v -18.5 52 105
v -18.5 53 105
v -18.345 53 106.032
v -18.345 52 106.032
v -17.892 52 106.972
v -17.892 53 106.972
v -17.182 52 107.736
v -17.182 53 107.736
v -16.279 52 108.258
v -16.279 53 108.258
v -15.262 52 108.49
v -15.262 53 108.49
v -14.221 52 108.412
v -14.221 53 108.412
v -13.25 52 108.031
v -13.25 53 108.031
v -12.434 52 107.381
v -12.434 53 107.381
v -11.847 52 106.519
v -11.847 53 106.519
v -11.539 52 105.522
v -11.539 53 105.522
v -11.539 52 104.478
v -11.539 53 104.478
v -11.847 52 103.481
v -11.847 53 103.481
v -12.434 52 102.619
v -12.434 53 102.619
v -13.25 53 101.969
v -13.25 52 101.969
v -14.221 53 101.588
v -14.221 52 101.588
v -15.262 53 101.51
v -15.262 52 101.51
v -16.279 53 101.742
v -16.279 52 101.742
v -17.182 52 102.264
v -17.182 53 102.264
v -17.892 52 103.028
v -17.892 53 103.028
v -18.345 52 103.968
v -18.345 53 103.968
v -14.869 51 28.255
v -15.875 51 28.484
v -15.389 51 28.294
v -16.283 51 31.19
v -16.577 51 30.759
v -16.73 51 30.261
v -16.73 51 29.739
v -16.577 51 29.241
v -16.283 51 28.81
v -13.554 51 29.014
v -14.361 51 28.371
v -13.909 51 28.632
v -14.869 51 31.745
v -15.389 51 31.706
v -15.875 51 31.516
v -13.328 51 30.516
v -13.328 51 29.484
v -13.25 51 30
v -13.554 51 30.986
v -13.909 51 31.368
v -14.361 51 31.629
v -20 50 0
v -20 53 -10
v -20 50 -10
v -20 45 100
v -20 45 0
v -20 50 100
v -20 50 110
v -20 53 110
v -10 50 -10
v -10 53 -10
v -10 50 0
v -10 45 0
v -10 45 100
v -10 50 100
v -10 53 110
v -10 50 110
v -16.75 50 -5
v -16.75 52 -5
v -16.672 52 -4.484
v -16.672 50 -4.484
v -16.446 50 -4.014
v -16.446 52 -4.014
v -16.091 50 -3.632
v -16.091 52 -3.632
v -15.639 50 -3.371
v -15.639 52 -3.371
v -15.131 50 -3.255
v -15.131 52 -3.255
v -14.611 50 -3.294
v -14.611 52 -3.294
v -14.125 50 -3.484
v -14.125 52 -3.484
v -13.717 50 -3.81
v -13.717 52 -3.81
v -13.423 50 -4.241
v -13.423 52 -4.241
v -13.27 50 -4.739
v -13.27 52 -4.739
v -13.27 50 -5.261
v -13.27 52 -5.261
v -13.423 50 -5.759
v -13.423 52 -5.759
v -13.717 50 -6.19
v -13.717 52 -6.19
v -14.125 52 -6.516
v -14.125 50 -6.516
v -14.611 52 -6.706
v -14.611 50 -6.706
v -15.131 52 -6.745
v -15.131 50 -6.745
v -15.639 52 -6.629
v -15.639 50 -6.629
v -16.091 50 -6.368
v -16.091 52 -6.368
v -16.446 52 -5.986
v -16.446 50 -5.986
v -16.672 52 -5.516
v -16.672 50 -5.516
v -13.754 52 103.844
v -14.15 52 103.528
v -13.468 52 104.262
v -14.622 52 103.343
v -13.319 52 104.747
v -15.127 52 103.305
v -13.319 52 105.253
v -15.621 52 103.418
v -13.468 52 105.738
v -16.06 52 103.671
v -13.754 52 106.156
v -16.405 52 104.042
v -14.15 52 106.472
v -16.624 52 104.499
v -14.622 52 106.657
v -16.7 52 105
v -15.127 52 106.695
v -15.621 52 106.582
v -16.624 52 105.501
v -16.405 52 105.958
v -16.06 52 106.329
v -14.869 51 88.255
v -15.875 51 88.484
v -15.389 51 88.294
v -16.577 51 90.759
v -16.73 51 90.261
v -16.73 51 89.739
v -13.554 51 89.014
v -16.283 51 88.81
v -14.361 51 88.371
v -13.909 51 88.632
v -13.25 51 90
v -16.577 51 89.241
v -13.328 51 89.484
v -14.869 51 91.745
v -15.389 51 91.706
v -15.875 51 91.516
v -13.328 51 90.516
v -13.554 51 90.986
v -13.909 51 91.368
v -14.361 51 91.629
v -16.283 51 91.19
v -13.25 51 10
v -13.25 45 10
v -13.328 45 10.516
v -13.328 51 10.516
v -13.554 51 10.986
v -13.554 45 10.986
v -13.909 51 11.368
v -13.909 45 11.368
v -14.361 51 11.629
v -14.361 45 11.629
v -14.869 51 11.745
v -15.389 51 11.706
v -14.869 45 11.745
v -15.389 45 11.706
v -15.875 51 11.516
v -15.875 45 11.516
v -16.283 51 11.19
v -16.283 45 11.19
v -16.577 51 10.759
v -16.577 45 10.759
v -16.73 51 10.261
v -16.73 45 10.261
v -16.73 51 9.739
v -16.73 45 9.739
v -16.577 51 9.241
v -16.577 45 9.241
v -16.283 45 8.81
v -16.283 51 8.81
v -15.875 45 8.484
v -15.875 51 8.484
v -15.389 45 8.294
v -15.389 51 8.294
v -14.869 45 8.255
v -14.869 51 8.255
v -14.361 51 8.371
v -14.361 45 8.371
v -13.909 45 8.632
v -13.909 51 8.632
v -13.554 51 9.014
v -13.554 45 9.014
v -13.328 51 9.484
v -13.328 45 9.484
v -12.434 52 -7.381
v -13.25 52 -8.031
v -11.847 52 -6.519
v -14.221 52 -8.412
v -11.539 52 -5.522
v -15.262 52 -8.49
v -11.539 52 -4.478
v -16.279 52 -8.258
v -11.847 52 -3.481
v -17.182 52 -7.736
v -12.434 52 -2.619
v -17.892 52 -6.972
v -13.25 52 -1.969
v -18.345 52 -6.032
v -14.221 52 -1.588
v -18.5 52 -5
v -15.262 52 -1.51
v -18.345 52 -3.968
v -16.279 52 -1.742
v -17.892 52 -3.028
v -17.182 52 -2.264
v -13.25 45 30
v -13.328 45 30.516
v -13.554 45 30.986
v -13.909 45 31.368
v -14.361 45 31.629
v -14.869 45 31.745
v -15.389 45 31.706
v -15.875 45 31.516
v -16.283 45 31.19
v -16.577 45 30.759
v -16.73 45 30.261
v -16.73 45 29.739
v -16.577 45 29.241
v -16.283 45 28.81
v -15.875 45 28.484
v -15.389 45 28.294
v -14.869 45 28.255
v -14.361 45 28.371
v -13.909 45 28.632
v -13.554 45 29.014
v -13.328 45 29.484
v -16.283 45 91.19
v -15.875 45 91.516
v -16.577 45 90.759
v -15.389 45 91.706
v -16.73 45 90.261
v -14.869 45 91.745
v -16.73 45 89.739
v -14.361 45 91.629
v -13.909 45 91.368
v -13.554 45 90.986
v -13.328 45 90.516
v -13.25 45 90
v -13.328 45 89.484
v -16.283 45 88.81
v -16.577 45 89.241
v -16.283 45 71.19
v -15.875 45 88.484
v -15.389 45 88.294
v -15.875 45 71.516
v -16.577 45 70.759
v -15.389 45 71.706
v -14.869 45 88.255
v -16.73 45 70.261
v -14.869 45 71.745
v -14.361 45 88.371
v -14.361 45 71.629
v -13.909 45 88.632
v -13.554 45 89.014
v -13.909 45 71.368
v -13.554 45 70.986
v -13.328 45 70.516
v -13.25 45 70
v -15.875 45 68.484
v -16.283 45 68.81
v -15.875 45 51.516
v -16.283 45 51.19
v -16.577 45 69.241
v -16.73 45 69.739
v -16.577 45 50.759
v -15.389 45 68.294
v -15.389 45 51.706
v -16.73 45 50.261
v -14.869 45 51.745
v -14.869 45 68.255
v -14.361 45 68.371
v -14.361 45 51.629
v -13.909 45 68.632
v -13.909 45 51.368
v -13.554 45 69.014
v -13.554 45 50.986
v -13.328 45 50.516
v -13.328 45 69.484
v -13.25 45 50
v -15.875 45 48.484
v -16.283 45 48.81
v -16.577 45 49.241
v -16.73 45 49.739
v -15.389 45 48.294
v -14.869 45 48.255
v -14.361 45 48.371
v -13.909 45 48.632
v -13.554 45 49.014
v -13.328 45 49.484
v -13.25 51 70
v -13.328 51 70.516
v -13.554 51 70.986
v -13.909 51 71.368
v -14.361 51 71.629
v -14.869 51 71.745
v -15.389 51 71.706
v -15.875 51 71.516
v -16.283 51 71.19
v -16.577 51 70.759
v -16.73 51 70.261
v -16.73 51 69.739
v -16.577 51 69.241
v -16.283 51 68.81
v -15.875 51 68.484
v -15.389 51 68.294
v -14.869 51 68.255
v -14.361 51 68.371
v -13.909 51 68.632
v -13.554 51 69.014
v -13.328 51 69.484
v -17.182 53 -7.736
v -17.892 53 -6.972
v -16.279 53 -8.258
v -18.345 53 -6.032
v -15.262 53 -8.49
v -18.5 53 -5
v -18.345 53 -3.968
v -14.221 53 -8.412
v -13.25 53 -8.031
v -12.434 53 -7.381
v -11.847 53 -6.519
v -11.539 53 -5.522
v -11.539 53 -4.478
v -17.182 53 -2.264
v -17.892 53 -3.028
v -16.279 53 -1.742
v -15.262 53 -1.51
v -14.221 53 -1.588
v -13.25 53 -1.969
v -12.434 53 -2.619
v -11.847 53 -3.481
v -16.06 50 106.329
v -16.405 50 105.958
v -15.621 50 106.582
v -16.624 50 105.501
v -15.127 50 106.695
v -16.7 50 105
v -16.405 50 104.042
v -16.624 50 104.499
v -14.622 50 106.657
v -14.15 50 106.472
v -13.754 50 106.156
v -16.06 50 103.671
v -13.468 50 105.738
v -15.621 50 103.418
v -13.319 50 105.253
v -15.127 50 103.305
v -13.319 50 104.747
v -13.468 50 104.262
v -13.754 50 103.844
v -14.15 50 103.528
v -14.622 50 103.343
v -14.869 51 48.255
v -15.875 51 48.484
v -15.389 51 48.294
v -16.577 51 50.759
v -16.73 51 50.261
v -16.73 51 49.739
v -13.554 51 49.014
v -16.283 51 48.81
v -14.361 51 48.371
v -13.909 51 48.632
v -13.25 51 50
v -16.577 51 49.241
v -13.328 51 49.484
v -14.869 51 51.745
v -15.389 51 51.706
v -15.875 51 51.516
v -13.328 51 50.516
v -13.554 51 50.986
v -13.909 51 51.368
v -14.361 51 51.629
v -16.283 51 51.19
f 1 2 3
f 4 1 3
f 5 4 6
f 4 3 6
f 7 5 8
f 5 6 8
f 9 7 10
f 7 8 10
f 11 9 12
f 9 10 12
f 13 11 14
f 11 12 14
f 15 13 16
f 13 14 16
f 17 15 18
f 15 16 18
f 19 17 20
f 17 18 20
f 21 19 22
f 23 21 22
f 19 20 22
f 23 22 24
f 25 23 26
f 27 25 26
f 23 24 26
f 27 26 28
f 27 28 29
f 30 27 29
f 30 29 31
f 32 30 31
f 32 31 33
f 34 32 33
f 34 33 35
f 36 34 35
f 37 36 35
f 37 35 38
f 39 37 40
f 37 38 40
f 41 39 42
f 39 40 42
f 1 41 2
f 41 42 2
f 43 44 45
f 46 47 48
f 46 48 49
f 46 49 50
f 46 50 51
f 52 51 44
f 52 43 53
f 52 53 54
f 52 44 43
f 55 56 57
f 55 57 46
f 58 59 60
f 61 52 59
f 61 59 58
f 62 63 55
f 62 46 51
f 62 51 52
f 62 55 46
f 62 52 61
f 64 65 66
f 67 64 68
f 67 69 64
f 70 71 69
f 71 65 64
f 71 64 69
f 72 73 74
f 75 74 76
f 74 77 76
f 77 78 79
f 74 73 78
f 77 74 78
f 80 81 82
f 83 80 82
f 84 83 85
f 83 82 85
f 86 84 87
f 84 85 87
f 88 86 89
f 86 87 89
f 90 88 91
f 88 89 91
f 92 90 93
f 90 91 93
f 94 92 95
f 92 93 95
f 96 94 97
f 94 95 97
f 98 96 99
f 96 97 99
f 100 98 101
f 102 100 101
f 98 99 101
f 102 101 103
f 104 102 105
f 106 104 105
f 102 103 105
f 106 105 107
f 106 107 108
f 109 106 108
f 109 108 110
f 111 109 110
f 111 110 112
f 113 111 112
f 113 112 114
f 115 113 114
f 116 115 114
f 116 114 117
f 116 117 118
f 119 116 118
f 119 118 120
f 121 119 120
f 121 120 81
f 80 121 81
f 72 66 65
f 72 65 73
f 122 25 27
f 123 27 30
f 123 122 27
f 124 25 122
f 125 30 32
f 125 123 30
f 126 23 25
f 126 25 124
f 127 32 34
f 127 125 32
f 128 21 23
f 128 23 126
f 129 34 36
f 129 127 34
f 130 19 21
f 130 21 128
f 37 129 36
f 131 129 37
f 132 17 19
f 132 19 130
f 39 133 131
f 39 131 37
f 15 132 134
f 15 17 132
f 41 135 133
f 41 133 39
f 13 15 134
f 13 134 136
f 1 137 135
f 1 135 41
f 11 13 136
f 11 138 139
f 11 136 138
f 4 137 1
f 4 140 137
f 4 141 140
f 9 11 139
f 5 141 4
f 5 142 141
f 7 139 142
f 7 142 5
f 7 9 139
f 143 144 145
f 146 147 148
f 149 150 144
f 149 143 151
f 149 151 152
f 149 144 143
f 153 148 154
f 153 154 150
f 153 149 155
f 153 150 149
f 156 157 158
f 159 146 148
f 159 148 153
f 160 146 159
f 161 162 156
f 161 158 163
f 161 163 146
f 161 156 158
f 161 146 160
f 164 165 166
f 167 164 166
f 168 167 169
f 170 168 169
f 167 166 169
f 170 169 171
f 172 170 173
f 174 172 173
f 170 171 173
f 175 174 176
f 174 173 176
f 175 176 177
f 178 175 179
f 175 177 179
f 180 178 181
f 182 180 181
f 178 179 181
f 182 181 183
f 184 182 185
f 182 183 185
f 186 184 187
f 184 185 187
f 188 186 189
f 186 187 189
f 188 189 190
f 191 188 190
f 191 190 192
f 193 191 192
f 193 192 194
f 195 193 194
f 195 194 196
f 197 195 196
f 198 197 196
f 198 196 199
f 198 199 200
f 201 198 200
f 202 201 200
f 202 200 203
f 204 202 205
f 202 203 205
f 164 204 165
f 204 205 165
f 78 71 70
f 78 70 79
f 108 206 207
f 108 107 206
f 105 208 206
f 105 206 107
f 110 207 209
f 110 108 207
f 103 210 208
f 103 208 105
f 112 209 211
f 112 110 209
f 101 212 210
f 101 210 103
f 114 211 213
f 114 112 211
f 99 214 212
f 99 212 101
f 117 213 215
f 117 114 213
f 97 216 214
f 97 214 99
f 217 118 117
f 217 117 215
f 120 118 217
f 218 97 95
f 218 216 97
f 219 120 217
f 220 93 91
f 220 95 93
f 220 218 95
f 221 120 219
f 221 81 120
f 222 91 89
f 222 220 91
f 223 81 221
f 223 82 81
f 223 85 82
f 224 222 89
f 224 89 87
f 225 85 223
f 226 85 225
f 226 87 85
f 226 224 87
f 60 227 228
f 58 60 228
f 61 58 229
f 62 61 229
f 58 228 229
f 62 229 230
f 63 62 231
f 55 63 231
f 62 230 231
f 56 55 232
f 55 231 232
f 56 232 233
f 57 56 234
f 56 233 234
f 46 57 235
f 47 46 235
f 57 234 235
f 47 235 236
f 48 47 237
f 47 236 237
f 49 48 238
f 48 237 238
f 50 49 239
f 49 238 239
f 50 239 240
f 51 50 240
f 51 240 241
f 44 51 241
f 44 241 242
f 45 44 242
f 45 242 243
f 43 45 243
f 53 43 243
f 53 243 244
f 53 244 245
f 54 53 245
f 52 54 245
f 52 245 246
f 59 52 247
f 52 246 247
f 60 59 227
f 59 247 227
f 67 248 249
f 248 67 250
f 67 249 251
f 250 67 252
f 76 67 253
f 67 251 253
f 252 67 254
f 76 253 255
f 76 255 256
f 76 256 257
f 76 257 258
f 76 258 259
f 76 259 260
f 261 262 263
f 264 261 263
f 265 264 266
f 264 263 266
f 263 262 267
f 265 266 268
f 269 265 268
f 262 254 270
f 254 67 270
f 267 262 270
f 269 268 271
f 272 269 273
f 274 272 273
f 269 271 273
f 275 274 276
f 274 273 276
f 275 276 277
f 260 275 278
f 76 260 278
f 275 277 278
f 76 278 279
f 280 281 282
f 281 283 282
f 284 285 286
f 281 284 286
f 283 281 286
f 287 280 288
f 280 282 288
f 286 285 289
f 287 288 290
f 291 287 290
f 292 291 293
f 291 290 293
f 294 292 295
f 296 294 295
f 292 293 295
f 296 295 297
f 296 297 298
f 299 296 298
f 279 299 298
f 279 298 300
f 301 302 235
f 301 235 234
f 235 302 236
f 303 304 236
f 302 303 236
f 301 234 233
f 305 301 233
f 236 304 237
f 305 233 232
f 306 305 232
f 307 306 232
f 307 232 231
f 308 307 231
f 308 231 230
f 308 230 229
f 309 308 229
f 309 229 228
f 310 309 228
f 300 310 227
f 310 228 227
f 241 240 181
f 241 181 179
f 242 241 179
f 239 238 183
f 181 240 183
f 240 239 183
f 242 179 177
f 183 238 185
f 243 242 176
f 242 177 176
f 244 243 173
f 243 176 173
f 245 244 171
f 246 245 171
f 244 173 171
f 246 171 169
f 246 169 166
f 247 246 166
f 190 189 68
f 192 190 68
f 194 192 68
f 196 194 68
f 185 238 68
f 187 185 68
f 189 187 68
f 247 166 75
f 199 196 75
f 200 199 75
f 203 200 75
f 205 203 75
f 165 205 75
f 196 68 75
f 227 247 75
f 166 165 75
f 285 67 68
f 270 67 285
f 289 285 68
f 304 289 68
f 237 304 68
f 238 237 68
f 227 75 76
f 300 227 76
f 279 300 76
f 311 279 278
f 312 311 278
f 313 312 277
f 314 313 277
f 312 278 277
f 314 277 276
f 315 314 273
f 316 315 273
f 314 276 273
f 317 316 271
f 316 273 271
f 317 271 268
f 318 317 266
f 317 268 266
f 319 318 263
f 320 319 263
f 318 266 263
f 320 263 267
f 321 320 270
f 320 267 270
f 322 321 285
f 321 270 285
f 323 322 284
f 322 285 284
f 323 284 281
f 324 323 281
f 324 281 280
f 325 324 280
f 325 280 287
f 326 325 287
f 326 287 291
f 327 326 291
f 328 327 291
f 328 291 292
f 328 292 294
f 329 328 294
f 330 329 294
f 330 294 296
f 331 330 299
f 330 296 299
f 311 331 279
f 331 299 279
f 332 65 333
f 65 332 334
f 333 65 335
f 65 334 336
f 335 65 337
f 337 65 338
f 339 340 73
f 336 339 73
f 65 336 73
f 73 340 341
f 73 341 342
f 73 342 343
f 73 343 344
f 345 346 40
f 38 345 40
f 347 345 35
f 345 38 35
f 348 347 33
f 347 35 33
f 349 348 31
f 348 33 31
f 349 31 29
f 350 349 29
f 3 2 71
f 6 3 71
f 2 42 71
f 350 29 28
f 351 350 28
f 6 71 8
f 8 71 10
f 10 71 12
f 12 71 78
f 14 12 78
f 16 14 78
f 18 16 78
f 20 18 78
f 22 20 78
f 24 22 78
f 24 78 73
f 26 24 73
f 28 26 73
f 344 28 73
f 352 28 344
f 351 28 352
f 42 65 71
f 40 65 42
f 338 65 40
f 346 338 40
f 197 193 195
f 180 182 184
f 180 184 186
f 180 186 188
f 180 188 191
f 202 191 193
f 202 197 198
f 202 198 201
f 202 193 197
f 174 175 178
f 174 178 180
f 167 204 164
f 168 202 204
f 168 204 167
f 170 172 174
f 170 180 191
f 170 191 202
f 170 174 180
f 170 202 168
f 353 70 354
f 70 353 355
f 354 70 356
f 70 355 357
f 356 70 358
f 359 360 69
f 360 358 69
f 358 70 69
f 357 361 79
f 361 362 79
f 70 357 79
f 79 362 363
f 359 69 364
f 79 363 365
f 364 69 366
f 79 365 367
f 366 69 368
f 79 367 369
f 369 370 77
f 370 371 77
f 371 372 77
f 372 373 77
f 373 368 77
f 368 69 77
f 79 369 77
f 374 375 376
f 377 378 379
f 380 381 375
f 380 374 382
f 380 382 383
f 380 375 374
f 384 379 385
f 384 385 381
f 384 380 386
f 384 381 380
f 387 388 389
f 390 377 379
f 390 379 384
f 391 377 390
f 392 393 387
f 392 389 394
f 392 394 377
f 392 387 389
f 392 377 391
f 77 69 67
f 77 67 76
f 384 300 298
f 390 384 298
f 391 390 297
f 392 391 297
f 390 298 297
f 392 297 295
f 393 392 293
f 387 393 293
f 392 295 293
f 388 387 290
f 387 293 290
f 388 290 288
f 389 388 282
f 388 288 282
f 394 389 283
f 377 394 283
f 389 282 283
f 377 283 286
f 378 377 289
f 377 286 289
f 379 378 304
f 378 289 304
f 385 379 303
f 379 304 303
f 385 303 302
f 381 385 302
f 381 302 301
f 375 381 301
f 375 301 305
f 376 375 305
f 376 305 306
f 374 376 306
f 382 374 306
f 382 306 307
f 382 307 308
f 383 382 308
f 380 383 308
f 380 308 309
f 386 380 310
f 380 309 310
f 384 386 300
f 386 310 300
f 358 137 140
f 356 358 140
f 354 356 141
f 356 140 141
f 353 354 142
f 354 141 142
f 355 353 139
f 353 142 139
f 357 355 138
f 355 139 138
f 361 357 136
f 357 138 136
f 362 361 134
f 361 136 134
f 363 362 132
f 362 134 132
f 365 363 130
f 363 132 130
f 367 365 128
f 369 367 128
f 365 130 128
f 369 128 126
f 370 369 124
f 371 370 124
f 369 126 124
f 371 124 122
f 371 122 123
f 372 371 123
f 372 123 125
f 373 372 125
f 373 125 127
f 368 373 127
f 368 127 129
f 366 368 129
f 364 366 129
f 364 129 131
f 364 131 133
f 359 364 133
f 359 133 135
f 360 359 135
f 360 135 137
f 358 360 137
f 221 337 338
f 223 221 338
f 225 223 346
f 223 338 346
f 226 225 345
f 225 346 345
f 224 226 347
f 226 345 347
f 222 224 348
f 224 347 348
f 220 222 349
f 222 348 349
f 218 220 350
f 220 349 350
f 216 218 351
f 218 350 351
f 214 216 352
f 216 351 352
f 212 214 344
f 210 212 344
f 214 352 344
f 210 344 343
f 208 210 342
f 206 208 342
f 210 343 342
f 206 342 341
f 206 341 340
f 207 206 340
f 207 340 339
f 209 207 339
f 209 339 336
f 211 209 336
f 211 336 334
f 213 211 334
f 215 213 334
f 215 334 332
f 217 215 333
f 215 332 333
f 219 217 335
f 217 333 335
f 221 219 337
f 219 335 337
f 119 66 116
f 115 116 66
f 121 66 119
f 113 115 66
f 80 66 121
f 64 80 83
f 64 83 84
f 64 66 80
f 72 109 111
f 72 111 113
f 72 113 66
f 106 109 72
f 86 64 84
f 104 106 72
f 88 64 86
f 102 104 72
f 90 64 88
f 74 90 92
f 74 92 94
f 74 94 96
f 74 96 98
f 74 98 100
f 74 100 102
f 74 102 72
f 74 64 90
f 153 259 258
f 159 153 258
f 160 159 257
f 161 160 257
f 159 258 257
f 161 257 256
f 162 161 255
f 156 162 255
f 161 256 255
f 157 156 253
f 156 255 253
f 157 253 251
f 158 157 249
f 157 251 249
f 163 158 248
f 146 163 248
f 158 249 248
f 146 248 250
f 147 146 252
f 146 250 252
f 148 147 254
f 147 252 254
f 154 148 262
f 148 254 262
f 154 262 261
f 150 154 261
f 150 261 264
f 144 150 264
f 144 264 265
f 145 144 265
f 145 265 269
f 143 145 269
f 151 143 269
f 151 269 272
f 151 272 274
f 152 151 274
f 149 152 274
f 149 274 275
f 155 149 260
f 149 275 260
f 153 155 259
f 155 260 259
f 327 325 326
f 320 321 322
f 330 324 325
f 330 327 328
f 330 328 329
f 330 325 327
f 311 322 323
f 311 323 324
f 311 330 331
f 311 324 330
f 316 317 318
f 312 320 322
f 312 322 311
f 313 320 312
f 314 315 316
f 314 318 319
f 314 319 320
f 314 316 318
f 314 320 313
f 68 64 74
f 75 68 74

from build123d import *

# Parameters (mm, degrees)
SKETCH003_W     = 10
SKETCH003_H     = 8
PAD002_DEPTH    = 100
SKETCH004_W     = 10
SKETCH004_H     = 3
PAD003_DEPTH    = 10
SKETCH005_R     = 1.7
POCKET001_DEPTH = 5
SKETCH006_R     = 3.5
POCKET002_DEPTH = 1
SKETCH007_W     = 10
SKETCH007_H     = 3
PAD004_DEPTH    = 10
SKETCH008_R     = 1.75
POCKET003_DEPTH = 5
SKETCH009_R     = 3.5
POCKET004_DEPTH = 1
SKETCH010_R     = 1.75
POCKET005_DEPTH = 6


with BuildPart() as part:
    # Sketch003 → Pad002 (new body)
    with BuildSketch(Plane.XY):
        with Locations((-15, 49)):
            Rectangle(SKETCH003_W, SKETCH003_H)
    extrude(amount=PAD002_DEPTH)

    # Sketch004 (on Face6 of Pad002) → Pad003 (join)
    with BuildSketch(Plane.XY.offset(100)):
        with Locations((-15, 51.5)):
            Rectangle(SKETCH004_W, SKETCH004_H)
    extrude(amount=PAD003_DEPTH)

    # Sketch005 (on Face5 of Pad003) → Pocket001 (cut)
    with BuildSketch(Plane(origin=(0, 53, 0), x_dir=(-1, 0, 0), z_dir=(0, 1, 0))):
        with Locations((15, 105)):
            Circle(SKETCH005_R)
    extrude(amount=-POCKET001_DEPTH, mode=Mode.SUBTRACT)

    # Sketch006 (on Face5 of Pocket001) → Pocket002 (cut)
    with BuildSketch(Plane(origin=(0, 53, 0), x_dir=(-1, 0, 0), z_dir=(0, 1, 0))):
        with Locations((15, 105)):
            Circle(SKETCH006_R)
    extrude(amount=-POCKET002_DEPTH, mode=Mode.SUBTRACT)

    # Sketch007 (on Face4 of Pocket002) → Pad004 (join)
    with BuildSketch(Plane(origin=(0, 0, 0), x_dir=(1, 0, 0), z_dir=(0, 0, -1))):
        with Locations((-15, -51.5)):
            Rectangle(SKETCH007_W, SKETCH007_H)
    extrude(amount=PAD004_DEPTH)

    # Sketch008 (on Face4 of Pad004) → Pocket003 (cut)
    with BuildSketch(Plane(origin=(0, 53, 0), x_dir=(-1, 0, 0), z_dir=(0, 1, 0))):
        with Locations((15, -5)):
            Circle(SKETCH008_R)
    extrude(amount=-POCKET003_DEPTH, mode=Mode.SUBTRACT)

    # Sketch009 (on Face4 of Pocket003) → Pocket004 (cut)
    with BuildSketch(Plane(origin=(0, 53, 0), x_dir=(-1, 0, 0), z_dir=(0, 1, 0))):
        with Locations((15, -5)):
            Circle(SKETCH009_R)
    extrude(amount=-POCKET004_DEPTH, mode=Mode.SUBTRACT)

    # Sketch010 (on Face6 of Pocket004) → Pocket005 (cut)
    with BuildSketch(Plane.XZ.offset(-45)):
        with Locations((-15, 90)):
            Circle(SKETCH010_R)
        with Locations((-15, 70)):
            Circle(SKETCH010_R)
        with Locations((-15, 50)):
            Circle(SKETCH010_R)
        with Locations((-15, 30)):
            Circle(SKETCH010_R)
        with Locations((-15, 10)):
            Circle(SKETCH010_R)
    extrude(amount=-POCKET005_DEPTH, mode=Mode.SUBTRACT)


solid = part.part
